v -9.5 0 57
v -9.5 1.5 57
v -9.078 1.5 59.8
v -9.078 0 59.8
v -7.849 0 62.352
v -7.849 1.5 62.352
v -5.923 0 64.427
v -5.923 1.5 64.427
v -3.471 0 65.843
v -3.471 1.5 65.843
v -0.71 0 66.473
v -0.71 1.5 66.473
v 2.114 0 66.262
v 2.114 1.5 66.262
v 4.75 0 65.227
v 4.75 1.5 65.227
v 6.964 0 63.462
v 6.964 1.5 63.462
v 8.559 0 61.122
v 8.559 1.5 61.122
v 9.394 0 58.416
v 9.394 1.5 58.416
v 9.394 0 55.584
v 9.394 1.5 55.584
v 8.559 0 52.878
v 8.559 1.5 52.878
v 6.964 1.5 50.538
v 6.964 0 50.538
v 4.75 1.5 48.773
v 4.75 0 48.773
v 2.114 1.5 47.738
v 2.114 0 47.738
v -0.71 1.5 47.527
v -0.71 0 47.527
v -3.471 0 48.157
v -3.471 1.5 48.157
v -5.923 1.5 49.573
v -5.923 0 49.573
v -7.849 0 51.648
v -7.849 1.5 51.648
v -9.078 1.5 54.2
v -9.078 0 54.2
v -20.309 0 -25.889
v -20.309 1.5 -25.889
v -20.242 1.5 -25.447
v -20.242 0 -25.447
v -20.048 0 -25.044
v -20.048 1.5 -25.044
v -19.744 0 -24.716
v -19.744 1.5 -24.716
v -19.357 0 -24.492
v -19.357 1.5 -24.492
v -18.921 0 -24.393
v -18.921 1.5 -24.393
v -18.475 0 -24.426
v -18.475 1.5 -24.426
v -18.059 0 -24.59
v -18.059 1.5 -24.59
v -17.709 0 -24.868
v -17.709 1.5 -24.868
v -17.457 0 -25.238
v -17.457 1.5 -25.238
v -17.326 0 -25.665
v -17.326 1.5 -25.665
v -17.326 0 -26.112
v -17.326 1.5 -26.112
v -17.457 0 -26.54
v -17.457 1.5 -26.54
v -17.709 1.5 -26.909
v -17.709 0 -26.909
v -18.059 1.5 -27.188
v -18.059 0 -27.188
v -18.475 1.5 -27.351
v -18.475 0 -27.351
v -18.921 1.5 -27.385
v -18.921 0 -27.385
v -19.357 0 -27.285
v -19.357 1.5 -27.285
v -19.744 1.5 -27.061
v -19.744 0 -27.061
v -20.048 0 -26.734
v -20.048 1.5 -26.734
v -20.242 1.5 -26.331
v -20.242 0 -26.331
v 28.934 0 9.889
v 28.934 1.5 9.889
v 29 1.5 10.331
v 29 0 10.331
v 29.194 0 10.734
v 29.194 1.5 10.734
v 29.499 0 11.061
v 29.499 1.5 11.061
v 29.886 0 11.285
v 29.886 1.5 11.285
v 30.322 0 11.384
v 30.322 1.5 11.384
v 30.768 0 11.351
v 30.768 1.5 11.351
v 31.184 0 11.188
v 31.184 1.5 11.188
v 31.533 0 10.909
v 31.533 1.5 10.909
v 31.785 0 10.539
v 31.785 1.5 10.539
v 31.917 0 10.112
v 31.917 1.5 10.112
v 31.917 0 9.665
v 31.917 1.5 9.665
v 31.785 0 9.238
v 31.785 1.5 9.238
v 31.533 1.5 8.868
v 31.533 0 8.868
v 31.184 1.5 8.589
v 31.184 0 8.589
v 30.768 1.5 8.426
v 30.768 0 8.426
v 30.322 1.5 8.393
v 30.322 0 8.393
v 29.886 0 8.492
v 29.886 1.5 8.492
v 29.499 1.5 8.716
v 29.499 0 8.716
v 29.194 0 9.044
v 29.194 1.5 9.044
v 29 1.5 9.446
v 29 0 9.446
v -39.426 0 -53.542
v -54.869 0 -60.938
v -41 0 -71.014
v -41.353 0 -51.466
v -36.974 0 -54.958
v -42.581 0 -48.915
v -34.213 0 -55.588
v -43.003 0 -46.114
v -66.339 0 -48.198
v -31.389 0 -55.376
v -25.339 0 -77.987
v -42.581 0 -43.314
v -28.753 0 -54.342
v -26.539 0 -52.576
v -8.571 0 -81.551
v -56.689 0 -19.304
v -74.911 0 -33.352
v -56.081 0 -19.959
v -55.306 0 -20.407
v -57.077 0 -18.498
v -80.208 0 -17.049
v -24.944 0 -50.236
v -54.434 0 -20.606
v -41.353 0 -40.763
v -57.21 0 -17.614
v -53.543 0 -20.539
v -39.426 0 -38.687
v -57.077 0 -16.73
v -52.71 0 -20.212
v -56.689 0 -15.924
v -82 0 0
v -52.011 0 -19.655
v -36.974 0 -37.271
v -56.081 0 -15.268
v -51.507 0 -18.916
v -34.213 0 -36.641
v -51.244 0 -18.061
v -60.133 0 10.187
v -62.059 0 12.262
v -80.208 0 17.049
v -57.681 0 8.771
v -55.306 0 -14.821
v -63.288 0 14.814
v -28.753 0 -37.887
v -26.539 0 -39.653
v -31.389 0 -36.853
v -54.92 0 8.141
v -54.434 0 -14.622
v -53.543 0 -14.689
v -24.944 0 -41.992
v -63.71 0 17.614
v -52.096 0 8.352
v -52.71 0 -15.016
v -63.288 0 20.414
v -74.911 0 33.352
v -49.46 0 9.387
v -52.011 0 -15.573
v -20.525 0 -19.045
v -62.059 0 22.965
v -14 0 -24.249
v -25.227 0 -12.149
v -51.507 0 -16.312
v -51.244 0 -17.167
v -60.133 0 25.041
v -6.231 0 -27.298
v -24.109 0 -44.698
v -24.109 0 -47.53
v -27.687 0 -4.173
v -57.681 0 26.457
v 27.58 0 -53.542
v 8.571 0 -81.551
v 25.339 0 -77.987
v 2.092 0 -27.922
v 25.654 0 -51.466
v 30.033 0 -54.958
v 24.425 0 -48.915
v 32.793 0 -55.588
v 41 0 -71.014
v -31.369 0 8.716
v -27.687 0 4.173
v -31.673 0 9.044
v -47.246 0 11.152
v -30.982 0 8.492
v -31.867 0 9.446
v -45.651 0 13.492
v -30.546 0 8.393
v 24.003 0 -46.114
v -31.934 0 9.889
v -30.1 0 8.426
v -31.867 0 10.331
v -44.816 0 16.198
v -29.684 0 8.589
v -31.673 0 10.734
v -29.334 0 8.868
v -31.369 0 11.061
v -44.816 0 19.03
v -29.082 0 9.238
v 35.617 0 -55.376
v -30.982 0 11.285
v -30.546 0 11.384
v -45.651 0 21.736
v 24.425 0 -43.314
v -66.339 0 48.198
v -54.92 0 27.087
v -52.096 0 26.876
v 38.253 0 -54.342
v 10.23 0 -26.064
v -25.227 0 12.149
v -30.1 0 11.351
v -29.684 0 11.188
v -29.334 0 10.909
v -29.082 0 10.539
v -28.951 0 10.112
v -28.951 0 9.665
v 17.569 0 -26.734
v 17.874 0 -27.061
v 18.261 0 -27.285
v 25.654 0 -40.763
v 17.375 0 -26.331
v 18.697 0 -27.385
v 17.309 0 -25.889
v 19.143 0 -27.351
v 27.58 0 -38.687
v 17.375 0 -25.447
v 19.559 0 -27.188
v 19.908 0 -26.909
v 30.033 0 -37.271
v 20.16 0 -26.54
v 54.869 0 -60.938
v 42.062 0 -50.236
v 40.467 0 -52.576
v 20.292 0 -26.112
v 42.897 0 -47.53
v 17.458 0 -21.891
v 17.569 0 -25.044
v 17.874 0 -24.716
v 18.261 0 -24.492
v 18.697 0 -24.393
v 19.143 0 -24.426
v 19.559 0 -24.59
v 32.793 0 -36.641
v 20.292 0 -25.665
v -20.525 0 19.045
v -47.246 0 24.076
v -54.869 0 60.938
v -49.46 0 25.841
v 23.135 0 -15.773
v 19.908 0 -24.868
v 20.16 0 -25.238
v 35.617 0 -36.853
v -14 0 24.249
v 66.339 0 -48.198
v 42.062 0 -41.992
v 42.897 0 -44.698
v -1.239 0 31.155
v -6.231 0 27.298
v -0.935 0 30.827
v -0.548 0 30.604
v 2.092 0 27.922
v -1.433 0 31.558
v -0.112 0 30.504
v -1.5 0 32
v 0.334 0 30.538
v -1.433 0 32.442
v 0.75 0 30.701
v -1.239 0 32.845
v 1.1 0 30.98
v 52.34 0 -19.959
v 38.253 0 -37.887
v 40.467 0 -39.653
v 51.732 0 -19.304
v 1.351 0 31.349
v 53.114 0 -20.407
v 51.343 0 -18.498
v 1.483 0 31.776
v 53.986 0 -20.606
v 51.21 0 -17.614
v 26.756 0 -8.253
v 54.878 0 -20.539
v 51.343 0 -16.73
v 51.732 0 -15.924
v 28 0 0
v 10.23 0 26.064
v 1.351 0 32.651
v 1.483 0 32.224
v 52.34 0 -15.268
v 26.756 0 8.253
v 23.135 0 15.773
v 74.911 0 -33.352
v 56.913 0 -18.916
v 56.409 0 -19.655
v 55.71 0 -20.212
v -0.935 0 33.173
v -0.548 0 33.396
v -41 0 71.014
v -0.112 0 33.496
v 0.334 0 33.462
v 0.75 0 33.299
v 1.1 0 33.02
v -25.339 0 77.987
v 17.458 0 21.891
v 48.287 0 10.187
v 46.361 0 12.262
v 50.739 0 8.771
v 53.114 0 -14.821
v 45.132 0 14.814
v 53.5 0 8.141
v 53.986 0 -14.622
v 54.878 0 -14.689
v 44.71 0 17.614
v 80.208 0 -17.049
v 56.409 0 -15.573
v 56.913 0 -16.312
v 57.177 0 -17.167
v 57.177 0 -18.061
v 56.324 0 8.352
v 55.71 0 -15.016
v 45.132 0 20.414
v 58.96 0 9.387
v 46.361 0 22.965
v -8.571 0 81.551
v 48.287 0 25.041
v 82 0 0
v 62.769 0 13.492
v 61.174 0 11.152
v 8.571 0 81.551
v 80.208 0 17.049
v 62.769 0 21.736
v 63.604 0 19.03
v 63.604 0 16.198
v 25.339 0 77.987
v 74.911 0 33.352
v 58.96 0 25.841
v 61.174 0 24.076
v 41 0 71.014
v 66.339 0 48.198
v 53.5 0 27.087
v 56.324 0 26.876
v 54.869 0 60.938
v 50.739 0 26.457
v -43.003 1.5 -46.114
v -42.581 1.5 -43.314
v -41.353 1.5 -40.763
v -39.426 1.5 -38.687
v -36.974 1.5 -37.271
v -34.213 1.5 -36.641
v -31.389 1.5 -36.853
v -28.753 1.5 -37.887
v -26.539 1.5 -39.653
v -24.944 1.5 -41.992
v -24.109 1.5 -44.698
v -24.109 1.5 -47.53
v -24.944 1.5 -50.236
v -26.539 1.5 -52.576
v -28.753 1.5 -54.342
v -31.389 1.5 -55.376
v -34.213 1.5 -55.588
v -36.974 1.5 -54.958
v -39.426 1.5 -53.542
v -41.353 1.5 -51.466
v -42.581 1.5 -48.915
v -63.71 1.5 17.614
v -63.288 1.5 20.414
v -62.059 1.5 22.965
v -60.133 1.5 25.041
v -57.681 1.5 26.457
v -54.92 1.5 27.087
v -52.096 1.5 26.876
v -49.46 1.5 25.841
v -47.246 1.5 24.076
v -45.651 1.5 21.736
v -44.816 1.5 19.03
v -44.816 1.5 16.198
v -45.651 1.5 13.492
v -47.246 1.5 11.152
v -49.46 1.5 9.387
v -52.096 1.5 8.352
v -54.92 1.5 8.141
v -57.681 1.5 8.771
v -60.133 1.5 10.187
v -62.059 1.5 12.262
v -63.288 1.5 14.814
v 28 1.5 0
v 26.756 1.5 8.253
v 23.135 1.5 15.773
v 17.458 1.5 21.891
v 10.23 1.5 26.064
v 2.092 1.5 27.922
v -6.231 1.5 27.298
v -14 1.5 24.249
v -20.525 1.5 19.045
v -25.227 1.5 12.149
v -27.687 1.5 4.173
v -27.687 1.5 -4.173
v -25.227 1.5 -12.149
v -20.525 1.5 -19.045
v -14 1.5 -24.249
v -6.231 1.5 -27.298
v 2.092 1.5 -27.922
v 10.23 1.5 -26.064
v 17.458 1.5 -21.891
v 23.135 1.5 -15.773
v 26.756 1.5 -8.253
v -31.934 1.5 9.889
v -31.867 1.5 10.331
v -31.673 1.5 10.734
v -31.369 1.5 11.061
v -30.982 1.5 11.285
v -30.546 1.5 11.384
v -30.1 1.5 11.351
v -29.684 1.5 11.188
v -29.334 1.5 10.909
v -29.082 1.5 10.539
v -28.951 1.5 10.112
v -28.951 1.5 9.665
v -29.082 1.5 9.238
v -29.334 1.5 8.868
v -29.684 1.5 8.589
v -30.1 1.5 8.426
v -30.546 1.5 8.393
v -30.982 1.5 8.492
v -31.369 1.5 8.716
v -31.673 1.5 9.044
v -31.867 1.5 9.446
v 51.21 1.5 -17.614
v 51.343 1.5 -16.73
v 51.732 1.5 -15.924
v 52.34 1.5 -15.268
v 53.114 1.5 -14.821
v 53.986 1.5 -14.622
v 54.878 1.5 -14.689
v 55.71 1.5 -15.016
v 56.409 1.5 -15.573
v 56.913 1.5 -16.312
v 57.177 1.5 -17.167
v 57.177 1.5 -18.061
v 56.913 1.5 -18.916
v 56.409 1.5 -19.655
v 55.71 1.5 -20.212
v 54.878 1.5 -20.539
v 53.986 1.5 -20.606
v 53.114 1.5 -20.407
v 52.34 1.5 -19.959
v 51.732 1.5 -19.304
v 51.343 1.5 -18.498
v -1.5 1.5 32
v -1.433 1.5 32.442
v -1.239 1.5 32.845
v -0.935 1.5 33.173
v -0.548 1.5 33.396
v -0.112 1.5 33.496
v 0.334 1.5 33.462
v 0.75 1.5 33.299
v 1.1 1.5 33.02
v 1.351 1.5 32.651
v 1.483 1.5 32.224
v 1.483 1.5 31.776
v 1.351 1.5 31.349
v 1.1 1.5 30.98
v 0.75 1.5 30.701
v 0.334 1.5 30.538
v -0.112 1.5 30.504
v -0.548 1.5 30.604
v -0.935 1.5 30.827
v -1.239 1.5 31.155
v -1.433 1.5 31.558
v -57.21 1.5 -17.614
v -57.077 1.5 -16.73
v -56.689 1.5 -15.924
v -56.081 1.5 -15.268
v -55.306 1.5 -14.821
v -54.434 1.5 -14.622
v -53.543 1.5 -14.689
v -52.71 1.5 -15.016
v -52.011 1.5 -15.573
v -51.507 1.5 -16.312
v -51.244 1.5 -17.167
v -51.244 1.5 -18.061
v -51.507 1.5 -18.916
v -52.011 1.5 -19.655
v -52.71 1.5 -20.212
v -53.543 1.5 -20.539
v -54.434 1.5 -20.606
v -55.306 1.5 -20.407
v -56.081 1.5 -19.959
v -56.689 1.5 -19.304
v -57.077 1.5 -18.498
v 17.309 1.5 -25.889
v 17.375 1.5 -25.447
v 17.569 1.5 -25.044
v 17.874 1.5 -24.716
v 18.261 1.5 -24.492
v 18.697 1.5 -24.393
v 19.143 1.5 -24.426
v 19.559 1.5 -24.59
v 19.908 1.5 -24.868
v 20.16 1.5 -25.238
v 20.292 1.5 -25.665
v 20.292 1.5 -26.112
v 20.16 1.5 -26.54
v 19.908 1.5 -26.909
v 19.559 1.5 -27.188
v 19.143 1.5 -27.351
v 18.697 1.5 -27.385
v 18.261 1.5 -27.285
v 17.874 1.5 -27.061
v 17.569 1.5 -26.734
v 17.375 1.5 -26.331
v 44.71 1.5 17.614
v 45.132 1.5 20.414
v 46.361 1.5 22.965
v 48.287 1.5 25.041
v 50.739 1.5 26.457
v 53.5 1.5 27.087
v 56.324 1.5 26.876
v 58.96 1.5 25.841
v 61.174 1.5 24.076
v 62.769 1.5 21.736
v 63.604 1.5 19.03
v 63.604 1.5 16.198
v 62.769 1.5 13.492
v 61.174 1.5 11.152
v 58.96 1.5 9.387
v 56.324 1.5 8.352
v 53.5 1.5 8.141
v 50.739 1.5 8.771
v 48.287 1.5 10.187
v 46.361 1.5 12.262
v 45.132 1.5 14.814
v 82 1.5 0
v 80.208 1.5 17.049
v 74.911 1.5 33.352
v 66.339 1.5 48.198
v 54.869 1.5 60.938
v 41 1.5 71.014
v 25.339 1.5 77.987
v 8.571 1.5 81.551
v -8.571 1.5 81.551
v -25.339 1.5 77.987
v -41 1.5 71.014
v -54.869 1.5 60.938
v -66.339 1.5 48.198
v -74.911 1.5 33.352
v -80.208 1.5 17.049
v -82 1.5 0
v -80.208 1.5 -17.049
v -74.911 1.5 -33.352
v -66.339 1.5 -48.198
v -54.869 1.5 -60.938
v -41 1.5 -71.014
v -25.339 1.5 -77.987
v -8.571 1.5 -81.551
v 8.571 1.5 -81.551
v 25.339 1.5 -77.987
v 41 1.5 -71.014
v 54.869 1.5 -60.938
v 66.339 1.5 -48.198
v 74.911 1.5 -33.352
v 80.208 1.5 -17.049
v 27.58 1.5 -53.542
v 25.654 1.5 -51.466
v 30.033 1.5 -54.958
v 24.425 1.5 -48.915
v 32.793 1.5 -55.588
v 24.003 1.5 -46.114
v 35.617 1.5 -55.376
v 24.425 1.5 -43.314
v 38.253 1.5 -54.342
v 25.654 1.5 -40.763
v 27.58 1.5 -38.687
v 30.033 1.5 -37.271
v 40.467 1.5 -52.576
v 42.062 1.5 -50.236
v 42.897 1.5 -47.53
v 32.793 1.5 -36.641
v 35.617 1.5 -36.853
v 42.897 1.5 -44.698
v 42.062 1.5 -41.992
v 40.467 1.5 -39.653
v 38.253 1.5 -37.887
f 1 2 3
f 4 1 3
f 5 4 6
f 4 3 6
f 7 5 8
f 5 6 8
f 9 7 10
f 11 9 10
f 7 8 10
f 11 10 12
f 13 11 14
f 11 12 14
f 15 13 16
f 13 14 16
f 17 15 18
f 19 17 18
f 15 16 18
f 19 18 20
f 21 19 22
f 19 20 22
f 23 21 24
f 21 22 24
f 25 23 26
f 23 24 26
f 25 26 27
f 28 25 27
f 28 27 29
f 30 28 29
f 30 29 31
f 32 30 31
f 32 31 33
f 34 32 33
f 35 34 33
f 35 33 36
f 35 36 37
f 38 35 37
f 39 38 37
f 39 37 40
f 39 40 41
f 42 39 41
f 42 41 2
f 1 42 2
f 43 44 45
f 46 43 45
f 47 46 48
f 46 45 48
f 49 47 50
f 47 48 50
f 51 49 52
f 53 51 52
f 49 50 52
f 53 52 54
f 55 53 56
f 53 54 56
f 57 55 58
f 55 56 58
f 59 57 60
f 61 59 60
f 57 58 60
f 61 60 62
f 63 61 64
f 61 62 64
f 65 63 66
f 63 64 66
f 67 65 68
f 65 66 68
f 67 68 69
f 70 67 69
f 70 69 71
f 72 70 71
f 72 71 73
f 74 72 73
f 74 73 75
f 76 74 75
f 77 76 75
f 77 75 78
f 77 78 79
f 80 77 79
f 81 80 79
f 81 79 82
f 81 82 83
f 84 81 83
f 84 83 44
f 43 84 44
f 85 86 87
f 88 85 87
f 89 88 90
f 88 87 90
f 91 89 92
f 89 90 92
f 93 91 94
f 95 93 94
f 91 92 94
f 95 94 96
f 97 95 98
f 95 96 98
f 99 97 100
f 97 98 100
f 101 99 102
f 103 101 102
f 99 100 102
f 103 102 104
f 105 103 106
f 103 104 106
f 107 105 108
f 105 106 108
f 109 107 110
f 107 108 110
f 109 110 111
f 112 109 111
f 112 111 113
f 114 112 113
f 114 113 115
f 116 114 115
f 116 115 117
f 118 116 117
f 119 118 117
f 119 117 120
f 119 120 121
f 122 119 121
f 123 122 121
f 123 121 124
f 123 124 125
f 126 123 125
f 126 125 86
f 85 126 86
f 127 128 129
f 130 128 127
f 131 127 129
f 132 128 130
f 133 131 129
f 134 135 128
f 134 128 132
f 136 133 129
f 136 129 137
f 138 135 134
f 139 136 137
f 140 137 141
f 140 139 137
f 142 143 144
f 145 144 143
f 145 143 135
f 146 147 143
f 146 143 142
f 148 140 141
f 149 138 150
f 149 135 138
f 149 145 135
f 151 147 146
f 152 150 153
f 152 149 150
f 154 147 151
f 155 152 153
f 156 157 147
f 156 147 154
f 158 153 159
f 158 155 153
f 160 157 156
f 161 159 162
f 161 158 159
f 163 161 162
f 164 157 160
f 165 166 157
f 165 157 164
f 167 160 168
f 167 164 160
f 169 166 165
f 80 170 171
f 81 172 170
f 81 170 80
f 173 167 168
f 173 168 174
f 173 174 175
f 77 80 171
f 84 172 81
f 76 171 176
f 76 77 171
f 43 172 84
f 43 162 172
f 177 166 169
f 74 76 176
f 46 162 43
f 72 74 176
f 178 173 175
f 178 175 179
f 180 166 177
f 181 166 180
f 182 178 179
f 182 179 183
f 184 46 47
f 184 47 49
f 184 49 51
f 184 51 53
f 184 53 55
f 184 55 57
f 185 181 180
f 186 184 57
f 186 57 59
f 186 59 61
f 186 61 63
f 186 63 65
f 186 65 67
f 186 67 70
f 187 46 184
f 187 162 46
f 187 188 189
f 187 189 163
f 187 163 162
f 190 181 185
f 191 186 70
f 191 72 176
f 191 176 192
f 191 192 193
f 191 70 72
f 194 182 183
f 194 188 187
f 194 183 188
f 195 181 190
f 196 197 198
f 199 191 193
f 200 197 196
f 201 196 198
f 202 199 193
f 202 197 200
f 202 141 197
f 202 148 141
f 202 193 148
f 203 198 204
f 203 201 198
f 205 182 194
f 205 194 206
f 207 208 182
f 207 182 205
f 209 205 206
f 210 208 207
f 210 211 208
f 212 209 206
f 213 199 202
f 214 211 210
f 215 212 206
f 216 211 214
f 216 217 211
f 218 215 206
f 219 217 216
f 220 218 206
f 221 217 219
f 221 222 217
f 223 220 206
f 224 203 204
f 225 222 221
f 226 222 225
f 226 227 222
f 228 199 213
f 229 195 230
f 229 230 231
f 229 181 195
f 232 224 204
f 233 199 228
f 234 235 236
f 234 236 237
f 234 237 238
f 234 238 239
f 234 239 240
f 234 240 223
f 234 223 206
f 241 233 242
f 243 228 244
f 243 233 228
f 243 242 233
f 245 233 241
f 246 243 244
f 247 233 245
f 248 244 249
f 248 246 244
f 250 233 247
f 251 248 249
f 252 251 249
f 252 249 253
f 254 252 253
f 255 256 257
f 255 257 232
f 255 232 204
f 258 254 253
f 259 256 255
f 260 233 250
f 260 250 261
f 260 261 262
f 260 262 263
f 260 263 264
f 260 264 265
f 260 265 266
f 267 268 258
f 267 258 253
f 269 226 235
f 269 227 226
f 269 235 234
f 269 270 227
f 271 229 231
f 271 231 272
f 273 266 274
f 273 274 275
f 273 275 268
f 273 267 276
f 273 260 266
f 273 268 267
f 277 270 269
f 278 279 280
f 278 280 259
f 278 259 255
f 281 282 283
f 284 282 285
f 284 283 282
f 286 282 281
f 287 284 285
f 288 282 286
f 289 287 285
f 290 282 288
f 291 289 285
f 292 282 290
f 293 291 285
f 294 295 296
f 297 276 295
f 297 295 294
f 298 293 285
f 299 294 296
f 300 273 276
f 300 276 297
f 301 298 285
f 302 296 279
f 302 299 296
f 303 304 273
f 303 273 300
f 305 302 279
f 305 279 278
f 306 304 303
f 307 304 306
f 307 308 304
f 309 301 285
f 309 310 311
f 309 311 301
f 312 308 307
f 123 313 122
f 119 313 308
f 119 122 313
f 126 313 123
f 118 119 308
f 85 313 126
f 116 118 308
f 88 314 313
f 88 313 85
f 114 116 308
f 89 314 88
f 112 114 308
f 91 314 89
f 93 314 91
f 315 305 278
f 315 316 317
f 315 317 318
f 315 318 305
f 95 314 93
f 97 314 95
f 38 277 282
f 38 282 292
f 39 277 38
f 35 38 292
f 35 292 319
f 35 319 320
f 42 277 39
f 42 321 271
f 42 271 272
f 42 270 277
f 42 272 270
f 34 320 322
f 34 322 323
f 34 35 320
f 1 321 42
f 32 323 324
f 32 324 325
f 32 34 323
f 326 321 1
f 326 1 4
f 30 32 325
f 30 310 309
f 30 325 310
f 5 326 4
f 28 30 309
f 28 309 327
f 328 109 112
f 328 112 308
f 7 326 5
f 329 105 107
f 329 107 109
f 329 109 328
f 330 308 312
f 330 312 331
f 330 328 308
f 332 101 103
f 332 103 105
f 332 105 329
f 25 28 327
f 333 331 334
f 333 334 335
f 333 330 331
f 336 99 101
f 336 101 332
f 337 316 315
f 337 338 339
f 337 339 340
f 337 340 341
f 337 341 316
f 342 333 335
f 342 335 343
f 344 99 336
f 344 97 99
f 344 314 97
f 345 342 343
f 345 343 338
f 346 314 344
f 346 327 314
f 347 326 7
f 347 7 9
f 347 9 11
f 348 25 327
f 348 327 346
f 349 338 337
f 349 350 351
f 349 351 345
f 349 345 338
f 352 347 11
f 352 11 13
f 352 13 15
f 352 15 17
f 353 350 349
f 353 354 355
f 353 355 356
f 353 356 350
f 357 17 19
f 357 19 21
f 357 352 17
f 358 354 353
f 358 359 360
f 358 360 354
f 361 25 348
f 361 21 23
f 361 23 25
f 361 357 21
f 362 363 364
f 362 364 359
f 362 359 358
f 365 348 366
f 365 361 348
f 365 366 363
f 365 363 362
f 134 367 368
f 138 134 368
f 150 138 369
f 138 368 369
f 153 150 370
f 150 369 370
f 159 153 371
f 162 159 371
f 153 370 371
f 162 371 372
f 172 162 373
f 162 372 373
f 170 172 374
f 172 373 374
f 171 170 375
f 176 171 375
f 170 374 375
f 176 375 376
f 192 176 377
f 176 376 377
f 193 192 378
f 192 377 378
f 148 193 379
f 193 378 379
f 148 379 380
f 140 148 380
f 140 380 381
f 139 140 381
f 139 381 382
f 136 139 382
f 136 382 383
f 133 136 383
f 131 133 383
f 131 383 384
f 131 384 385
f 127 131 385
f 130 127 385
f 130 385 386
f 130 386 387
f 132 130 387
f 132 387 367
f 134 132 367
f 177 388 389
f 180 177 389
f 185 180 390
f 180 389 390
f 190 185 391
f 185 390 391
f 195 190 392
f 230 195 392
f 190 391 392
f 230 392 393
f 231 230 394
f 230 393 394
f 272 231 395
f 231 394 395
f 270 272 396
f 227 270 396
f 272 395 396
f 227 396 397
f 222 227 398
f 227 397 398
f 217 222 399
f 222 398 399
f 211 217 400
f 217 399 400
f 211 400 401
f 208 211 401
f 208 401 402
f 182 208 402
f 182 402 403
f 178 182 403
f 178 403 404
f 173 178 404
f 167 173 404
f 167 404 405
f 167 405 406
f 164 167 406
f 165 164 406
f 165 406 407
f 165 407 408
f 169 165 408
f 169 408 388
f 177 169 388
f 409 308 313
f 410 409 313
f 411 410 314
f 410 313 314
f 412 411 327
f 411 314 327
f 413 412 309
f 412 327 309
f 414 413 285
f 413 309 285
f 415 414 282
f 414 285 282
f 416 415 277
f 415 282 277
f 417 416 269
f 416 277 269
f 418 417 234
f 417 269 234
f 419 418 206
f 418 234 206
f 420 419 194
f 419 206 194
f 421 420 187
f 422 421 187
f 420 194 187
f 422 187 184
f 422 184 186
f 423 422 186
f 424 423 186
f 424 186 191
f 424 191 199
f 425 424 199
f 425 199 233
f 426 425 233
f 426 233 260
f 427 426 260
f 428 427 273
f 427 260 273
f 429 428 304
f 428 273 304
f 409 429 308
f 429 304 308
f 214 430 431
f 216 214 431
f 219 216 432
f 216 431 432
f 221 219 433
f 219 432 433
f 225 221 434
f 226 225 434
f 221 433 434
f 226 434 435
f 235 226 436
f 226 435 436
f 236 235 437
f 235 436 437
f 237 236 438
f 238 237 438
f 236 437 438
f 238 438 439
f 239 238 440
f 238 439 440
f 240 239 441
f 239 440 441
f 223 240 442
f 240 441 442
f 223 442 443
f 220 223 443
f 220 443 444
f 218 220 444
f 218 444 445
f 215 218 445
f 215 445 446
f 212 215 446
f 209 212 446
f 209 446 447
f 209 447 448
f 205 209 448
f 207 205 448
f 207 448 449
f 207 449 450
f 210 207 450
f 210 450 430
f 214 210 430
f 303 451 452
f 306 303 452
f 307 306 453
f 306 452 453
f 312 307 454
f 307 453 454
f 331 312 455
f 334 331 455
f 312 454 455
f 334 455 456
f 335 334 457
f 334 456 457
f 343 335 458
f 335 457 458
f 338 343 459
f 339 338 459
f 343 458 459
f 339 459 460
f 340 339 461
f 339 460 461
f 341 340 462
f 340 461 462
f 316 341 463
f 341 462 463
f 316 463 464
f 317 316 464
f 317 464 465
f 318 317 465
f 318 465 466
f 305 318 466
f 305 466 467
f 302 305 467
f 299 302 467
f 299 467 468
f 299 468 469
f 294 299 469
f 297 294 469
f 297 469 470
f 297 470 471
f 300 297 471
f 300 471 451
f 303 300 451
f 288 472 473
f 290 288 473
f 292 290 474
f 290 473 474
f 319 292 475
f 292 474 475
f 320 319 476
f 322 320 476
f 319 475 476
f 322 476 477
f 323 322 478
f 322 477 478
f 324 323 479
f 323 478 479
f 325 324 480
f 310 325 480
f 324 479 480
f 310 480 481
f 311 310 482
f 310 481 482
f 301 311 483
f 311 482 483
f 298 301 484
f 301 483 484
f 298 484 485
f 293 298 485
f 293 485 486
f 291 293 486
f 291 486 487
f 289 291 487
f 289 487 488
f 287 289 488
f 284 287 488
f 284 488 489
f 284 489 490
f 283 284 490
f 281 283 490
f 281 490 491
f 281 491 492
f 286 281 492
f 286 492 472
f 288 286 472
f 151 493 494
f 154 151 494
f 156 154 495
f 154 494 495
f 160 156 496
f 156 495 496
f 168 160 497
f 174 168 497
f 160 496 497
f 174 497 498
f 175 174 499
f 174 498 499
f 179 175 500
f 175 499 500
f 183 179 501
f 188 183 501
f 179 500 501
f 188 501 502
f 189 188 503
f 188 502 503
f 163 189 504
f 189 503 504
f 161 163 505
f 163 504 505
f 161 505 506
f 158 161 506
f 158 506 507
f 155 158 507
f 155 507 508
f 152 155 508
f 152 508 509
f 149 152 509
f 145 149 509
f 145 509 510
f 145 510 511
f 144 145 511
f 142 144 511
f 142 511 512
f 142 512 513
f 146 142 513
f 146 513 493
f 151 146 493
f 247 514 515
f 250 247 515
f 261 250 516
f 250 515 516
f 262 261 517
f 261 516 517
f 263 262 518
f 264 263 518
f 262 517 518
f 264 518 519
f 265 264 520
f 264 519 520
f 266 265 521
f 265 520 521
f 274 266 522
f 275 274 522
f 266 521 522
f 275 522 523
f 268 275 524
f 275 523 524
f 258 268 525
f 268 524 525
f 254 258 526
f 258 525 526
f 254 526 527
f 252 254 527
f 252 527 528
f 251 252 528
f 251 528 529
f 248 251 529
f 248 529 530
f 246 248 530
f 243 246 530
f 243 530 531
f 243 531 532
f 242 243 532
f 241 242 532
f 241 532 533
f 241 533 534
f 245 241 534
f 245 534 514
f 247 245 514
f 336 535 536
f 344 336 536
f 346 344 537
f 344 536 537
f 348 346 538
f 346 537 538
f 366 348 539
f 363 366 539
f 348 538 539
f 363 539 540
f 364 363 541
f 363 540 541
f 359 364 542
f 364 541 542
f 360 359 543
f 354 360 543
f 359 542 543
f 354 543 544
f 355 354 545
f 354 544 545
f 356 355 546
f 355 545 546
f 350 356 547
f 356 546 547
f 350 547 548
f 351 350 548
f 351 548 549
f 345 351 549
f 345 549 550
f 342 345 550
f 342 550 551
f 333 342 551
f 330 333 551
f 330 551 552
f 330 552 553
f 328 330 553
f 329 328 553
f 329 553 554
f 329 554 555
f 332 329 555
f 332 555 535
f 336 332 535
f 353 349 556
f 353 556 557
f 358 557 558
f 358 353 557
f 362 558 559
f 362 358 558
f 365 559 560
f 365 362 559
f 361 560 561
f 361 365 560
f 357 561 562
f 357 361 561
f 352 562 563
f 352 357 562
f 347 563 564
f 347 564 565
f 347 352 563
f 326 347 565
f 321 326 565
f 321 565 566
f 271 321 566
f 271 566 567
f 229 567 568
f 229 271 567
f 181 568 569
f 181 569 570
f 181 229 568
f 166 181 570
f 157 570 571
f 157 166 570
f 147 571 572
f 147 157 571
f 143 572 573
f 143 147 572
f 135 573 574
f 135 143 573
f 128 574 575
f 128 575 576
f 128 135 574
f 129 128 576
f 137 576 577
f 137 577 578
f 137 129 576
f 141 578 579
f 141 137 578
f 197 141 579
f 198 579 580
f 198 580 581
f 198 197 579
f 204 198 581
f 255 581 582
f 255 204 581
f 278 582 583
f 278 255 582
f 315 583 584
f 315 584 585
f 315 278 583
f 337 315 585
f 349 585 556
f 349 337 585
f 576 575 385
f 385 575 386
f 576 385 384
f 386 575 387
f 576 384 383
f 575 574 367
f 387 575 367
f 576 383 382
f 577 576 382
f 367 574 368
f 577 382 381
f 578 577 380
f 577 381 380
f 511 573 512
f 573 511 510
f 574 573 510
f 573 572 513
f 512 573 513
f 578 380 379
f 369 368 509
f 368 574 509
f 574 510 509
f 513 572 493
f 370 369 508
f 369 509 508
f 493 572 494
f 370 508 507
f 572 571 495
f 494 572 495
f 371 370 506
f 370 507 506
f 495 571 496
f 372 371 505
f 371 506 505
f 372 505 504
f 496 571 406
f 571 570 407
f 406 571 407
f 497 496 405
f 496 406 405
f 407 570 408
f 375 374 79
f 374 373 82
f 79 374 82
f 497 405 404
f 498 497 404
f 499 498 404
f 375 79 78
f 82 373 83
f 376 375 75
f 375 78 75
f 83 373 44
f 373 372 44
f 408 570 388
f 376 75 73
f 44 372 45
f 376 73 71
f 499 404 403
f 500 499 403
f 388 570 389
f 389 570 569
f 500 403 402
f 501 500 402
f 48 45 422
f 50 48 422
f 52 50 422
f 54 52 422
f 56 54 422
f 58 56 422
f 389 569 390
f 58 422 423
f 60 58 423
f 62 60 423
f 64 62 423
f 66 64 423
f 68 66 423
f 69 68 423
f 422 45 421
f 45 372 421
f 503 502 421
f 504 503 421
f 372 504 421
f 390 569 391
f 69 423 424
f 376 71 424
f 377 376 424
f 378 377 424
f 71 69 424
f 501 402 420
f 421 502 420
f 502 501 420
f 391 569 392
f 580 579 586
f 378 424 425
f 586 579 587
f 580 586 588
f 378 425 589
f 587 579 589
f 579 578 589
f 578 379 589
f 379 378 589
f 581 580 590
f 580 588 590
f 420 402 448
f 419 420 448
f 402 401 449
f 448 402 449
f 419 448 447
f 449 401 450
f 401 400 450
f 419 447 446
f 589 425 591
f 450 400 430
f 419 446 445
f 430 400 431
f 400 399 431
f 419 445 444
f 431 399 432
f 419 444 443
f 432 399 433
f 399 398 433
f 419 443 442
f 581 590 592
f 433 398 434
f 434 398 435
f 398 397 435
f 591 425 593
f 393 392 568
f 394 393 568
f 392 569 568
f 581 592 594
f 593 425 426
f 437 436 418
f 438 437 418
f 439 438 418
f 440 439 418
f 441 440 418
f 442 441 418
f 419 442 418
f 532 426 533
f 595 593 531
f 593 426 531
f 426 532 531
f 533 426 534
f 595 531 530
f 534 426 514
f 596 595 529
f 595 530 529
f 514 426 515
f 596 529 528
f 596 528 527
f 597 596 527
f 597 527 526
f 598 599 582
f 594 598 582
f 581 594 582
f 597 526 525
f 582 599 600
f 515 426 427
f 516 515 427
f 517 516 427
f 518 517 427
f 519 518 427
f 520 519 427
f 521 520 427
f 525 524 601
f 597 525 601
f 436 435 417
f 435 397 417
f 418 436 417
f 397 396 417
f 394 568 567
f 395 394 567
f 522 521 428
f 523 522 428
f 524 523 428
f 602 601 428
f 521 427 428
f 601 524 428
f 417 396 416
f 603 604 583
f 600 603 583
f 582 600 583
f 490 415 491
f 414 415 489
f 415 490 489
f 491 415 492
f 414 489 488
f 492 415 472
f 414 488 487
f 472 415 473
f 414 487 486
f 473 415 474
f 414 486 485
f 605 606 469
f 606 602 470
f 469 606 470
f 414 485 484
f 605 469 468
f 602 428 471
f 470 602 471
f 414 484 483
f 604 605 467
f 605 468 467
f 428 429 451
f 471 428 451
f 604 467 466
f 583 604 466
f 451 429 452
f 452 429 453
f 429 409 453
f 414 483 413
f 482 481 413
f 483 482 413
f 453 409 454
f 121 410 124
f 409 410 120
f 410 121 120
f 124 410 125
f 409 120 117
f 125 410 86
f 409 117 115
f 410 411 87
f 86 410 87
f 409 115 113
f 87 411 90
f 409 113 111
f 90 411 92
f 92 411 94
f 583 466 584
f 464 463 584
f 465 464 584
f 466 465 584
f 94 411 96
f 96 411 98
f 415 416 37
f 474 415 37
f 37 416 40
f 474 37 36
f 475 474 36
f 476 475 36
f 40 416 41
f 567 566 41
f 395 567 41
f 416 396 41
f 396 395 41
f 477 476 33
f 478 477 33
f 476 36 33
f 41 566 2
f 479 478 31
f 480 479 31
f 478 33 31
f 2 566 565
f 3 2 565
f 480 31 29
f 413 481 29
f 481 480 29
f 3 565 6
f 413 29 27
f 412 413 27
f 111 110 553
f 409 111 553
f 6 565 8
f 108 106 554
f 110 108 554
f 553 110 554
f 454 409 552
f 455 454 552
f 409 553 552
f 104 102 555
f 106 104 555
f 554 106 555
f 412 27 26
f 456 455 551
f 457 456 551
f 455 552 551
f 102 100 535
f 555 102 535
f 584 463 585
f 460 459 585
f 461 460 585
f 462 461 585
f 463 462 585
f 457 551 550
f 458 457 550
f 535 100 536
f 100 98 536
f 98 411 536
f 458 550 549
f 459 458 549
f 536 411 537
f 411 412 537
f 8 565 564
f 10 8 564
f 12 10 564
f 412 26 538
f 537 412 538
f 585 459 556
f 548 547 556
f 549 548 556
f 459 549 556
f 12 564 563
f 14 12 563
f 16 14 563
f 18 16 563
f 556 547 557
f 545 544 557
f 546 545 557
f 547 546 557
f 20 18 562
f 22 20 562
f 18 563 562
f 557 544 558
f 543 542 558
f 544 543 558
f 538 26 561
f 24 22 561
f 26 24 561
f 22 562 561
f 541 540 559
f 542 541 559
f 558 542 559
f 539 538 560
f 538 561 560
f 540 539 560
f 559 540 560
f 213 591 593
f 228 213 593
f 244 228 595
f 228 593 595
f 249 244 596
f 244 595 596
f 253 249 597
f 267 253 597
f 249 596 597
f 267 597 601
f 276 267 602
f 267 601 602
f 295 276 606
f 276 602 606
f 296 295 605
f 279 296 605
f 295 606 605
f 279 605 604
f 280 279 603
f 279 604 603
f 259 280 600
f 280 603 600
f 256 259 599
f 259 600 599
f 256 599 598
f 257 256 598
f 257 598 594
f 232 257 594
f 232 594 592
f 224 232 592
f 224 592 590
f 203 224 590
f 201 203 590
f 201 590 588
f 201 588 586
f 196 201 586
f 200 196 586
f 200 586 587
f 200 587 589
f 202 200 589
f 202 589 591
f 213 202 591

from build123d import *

# Parameters (mm, degrees)
F0_R     = 82
F0_R_2   = 32
F0_R_3   = 28
F1_DEPTH = 1.5
F2_D     = 19
F3_D     = 6
F4_D     = 3


with BuildPart() as f1:
    # F0 (on Front) → F1 (new body)
    with BuildSketch(Plane.XZ):
        Circle(F0_R)
        Circle(F0_R_2, mode=Mode.SUBTRACT)
        Circle(F0_R_2)
        Circle(F0_R_3, mode=Mode.SUBTRACT)
    extrude(amount=-F1_DEPTH)

    # F2 (through all)
    with Locations(Plane.XZ):
        with Locations((0, 57), (54.2102264595, 17.6139531965), (33.5032664595, -46.1143268035), (-33.5032664595, -46.1143268035), (-54.2102264595, 17.6139531965)):
            Hole(F2_D / 2)

    # F3 (through all)
    with Locations(Plane.XZ):
        with Locations((-54.2102163981, -17.6139841623), (54.2102163981, -17.6139841623)):
            Hole(F3_D / 2)

    # F4 (through all)
    with Locations(Plane.XZ):
        with Locations((18.8088513457, -25.8887448722), (30.4338113457, 9.8885351278), (-18.8088513457, -25.8887448722), (-30.4338113457, 9.8885351278), (0, 32)):
            Hole(F4_D / 2)


solid = f1.part
